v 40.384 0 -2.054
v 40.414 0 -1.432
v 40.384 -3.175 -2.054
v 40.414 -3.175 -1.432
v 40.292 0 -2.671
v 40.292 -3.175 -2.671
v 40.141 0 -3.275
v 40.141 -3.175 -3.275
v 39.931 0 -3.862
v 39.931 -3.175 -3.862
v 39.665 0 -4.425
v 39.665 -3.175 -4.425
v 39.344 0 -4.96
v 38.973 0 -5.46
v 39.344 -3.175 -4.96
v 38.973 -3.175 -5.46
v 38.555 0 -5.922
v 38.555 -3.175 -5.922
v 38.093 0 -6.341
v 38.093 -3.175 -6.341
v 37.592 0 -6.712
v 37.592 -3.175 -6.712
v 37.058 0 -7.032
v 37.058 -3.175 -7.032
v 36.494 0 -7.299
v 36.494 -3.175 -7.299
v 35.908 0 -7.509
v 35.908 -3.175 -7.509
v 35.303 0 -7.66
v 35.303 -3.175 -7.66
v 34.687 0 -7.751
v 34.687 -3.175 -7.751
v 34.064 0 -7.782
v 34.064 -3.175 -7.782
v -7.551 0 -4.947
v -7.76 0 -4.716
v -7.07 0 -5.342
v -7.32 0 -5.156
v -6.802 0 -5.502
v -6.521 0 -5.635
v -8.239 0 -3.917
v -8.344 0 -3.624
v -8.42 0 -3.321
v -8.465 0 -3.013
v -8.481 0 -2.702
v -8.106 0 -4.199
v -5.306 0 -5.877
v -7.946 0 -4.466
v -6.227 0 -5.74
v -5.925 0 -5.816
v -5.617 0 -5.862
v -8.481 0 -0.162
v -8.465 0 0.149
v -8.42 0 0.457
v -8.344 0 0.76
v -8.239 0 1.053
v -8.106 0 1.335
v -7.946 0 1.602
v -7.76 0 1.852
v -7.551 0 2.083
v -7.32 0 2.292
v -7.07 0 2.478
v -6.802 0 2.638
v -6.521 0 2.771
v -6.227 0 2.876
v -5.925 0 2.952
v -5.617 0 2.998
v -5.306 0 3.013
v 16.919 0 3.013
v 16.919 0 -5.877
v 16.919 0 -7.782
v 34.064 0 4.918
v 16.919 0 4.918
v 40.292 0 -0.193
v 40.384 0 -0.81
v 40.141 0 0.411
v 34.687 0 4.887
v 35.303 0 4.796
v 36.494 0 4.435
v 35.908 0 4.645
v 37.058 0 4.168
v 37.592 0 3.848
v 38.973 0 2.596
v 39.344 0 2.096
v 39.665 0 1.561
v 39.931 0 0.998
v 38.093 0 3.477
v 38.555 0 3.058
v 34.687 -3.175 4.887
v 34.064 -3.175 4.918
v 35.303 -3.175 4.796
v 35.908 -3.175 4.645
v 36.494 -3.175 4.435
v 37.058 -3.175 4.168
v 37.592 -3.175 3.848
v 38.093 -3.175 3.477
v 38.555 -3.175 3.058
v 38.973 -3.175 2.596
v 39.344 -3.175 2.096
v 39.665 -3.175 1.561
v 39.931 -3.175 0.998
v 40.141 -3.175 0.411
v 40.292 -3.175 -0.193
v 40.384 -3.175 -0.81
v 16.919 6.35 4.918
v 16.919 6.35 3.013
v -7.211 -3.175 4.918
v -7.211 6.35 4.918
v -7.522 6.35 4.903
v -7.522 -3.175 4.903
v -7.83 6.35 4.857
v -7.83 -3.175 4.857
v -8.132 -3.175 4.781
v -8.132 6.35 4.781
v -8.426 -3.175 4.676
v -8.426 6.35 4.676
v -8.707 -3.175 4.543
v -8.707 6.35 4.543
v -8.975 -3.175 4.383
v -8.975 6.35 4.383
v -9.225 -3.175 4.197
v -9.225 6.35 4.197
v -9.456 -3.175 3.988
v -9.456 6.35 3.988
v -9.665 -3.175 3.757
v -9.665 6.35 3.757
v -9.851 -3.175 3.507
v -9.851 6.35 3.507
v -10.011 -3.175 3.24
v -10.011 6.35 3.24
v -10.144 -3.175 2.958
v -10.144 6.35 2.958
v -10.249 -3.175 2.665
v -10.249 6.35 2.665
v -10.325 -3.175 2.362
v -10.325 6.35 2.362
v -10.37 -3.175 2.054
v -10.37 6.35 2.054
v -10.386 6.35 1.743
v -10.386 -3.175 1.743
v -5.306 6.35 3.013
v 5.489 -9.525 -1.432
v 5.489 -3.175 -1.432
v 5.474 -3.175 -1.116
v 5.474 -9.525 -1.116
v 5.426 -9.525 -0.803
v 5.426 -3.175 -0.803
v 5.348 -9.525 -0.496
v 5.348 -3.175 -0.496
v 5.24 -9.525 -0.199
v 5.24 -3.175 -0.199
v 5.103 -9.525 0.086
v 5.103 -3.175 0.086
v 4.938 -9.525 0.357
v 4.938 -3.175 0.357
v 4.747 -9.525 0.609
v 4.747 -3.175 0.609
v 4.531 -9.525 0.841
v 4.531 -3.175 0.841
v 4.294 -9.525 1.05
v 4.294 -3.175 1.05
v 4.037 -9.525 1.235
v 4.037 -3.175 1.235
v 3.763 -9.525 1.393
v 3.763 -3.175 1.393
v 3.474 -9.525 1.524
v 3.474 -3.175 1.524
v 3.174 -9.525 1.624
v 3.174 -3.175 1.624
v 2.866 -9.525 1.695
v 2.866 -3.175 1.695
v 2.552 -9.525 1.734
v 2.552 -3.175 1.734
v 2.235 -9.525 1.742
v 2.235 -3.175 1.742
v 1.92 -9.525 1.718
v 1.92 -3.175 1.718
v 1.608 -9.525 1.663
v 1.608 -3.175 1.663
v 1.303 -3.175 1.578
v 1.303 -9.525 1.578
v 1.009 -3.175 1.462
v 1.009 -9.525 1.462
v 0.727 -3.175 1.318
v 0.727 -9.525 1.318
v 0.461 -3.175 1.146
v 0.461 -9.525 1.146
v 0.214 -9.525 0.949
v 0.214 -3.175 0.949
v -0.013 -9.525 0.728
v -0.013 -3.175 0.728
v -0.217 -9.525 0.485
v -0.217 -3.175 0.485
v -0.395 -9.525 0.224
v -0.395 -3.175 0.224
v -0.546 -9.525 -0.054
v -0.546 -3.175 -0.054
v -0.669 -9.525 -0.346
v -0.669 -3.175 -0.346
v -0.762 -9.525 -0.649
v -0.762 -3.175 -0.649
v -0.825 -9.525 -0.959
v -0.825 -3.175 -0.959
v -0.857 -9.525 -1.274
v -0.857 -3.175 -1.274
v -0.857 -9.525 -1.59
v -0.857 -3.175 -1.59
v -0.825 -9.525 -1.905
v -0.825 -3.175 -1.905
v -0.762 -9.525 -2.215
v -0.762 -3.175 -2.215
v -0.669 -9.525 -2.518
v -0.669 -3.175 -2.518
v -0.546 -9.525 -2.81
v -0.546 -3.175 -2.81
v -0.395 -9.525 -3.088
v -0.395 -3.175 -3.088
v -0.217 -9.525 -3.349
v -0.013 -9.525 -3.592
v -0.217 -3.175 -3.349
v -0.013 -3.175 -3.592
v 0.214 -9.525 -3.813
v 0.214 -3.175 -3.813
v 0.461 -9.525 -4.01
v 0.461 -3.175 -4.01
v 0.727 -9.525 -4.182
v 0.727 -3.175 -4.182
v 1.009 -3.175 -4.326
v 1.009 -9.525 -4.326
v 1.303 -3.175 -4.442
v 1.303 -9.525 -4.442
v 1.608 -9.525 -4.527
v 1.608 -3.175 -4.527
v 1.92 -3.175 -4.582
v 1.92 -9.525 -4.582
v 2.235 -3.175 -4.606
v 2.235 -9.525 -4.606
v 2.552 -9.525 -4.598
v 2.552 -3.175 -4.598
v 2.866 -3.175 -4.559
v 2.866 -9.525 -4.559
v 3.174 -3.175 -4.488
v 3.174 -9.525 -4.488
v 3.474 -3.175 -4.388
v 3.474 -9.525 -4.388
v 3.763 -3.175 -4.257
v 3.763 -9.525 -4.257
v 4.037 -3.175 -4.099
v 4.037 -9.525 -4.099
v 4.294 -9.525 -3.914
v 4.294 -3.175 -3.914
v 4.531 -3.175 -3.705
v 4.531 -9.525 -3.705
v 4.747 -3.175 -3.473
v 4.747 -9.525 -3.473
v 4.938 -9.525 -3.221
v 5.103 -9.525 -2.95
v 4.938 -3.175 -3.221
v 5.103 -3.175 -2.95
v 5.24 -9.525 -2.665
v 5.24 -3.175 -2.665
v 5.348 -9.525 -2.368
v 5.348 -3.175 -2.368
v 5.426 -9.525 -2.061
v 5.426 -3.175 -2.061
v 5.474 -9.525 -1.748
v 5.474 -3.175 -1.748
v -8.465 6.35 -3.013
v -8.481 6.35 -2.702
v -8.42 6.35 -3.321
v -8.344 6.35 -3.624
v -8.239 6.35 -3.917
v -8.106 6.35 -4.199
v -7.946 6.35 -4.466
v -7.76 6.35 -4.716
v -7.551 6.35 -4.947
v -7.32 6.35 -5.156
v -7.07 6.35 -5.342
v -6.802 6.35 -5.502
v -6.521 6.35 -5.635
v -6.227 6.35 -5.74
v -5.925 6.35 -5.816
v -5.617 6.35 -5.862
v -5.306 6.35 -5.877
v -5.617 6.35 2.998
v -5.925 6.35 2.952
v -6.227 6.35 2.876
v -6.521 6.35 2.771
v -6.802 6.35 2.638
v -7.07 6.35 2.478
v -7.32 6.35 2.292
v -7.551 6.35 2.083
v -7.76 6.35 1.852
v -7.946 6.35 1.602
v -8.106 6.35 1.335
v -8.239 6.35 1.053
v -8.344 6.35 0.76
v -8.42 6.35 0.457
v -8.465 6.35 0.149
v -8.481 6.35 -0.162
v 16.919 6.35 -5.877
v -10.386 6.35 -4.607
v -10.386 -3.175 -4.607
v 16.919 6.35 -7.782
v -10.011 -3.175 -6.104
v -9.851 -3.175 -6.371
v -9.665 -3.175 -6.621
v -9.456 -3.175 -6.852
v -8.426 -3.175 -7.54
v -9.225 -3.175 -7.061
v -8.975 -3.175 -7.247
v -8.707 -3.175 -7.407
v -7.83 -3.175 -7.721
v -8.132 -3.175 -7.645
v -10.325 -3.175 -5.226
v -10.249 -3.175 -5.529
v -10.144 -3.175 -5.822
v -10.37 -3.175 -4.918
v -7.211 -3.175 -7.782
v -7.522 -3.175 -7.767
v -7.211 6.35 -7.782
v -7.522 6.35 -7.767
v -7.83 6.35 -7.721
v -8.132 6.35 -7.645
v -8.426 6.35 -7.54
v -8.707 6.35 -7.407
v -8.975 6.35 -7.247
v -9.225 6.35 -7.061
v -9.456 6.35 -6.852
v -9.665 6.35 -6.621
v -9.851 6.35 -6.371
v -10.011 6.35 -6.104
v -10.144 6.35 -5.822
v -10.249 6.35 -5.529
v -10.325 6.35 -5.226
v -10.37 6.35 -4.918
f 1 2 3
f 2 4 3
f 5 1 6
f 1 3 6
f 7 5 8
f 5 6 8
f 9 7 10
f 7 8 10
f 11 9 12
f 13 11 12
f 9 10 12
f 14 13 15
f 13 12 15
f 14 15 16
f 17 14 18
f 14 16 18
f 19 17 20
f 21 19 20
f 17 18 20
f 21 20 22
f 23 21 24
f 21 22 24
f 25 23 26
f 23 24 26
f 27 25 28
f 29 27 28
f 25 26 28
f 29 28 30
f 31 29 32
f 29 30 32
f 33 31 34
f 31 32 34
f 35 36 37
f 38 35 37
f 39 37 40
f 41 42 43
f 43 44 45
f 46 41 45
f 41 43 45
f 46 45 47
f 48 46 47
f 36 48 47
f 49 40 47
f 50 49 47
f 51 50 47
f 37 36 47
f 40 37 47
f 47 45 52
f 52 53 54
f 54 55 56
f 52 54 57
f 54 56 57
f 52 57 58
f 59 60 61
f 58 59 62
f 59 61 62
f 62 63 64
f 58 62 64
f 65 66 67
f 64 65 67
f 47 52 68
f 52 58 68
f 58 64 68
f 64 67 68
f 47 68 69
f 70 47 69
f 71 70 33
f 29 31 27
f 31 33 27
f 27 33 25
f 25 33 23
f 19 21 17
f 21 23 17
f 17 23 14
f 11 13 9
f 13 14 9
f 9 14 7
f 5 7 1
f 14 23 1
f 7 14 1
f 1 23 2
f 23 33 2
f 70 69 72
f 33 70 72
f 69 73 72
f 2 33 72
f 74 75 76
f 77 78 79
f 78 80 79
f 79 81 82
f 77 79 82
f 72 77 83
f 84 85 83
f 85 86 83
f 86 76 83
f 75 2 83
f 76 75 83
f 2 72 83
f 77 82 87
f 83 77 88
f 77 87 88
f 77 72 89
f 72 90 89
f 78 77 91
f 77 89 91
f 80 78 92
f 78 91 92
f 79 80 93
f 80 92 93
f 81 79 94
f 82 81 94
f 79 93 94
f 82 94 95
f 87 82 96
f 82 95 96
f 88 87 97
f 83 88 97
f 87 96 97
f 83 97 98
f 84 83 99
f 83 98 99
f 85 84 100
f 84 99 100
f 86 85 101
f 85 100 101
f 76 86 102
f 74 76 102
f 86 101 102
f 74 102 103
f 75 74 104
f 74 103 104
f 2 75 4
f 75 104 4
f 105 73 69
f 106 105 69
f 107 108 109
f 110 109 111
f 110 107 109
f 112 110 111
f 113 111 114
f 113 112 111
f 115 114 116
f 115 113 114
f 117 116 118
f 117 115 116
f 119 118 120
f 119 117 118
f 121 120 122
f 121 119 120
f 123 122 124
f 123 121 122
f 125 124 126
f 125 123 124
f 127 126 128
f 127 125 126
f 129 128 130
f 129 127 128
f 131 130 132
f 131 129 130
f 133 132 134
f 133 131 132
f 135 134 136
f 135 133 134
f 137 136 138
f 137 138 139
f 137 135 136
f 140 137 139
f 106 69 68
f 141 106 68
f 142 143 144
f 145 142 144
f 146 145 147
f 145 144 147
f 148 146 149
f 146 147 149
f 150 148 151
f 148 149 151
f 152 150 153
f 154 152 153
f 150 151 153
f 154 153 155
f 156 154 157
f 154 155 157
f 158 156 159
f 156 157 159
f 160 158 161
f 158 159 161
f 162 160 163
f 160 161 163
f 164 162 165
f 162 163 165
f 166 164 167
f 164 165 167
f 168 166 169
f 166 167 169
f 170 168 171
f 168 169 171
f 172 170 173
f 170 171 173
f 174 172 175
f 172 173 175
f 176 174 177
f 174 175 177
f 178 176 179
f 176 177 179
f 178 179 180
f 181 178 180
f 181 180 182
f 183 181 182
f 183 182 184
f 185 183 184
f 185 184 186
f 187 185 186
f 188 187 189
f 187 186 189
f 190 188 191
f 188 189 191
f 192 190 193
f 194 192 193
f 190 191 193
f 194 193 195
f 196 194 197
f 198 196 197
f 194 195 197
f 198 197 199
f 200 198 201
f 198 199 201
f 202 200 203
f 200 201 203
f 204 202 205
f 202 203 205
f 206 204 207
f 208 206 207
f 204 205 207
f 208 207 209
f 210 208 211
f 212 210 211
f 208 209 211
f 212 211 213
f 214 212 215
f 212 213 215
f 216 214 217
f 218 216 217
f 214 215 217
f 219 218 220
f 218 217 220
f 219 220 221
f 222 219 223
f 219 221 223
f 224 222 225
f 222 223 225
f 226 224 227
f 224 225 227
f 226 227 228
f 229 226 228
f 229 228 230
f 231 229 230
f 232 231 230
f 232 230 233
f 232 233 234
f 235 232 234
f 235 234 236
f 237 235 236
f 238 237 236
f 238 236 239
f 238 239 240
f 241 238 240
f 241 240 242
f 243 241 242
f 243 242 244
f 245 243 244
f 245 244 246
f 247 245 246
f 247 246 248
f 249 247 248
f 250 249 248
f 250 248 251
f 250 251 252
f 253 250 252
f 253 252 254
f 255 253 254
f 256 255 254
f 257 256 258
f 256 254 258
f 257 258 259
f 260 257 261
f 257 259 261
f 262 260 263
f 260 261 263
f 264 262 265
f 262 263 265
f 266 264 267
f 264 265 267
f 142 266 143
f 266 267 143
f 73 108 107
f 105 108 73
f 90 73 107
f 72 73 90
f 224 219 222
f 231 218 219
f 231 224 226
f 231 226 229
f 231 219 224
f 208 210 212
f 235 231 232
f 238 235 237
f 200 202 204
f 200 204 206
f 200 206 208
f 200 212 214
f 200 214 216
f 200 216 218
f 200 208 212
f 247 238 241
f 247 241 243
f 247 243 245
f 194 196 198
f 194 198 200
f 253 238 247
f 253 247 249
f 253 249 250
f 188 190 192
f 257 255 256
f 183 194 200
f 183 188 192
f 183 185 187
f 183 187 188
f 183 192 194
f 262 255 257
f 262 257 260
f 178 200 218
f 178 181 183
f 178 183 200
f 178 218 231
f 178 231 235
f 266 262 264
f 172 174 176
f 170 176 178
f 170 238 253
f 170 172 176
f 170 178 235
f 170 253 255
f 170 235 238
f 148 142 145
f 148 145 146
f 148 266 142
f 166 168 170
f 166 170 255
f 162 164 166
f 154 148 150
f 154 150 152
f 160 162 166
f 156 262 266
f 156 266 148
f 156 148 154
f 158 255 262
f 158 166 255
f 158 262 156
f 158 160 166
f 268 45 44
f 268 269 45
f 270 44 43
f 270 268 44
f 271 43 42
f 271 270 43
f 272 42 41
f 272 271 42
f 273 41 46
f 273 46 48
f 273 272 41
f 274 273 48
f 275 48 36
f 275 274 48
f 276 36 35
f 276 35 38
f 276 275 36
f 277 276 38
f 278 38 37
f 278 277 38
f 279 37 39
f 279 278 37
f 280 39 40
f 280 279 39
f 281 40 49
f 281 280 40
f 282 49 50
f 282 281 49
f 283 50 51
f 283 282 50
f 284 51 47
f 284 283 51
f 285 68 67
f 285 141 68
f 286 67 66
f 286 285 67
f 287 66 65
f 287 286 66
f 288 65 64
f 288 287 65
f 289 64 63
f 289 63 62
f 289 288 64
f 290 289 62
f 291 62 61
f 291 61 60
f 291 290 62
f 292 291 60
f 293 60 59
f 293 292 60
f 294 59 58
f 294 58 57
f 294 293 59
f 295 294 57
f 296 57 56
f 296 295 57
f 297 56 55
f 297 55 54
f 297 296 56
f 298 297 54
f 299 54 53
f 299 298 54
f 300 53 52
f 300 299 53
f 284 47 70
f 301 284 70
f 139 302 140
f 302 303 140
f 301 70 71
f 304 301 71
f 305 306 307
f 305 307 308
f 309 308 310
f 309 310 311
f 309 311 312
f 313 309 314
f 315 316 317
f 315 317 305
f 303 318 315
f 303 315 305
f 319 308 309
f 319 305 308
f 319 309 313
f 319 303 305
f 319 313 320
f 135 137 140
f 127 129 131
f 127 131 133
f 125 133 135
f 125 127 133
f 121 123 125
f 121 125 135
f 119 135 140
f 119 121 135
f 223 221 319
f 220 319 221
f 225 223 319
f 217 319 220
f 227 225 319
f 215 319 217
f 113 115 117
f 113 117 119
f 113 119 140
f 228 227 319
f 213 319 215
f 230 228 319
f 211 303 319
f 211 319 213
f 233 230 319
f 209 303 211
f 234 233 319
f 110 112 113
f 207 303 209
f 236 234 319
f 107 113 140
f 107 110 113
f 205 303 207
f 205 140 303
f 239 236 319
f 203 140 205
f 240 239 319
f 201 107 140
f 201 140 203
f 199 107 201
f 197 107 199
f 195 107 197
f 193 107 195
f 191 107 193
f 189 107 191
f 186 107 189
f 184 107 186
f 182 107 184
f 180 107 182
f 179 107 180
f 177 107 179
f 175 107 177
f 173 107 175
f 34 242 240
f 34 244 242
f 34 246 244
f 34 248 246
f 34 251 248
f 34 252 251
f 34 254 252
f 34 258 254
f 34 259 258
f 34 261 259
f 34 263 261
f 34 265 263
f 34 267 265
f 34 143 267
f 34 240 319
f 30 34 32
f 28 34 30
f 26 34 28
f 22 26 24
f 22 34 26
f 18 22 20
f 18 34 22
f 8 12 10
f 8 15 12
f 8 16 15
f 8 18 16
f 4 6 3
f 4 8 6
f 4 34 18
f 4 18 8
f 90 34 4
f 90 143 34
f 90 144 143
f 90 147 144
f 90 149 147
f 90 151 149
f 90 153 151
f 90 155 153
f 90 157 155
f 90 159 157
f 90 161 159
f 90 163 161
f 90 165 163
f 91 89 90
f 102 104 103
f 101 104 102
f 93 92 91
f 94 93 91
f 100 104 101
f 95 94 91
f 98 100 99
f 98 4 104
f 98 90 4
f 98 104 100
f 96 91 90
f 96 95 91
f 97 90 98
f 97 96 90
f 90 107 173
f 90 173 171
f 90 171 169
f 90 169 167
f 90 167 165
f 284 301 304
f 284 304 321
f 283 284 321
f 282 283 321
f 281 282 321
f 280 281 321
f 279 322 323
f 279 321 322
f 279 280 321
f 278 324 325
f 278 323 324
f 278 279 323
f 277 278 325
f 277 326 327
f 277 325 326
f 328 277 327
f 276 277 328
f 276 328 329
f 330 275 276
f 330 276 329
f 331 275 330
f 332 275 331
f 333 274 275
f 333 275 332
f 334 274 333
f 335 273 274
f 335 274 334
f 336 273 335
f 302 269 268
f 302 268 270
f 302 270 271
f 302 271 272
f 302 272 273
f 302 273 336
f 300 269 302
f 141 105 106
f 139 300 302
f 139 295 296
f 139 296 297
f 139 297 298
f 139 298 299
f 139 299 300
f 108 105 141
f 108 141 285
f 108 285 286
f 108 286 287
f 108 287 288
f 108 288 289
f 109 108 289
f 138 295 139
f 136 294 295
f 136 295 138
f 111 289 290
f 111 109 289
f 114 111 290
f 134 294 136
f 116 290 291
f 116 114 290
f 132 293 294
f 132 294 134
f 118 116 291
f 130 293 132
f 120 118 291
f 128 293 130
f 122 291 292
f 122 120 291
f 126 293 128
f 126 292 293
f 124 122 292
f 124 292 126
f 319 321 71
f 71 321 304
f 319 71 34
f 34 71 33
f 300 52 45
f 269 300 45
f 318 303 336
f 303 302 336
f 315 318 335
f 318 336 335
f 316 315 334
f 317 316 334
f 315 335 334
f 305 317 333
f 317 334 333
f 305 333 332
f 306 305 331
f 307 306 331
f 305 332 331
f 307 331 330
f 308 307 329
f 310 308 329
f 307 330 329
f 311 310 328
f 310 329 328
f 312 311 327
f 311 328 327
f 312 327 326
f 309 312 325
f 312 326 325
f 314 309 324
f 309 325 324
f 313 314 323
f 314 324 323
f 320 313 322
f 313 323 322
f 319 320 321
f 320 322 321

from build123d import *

# Parameters (mm, degrees)
F0_W     = 50.8
F0_H     = 12.7
F1_DEPTH = 3.175
F2_R     = 3.175
F3_DEPTH = 6.35
F5_DEPTH = 6.35
F6_R     = 6.34999
F7_R     = 3.175


# Not quite as in the source:
# - a fillet or chamfer is up to 0.001 mm smaller than in the source, because OpenCascade refuses the exact size


with BuildPart() as f1:
    # F0 (on Front) → F1 (new body)
    with BuildSketch(Plane.XZ):
        with Locations((15.0143924374, -1.4320164919)):
            Rectangle(F0_W, F0_H)
    extrude(amount=F1_DEPTH)

    # F2 (on face) → F3 (join)
    with BuildSketch(Plane.XZ.offset(3.175)):
        with Locations((2.3143924374, -1.4320164919)):
            Circle(F2_R)
    extrude(amount=F3_DEPTH)

    # F4 (on face) → F5 (join)
    with BuildSketch(Plane(origin=(0, 0, 0), x_dir=(-1, 0, 0), z_dir=(0, 1, 0))):
        Polygon((8.4806075626, 3.0129835081), (8.4806075626, -5.8770164919), (-16.9193924374, -5.8770164919), (-16.9193924374, -7.7820164919), (10.3856075626, -7.7820164919), (10.3856075626, 4.9179835081), (-16.9193924374, 4.9179835081), (-16.9193924374, 3.0129835081), align=None)
    extrude(amount=F5_DEPTH)

    # F6 (radius 6.35 in the source; OpenCascade refuses exactly that, so slightly less here)
    f6_edges = [f1.edges().sort_by_distance(p)[0] for p in [
        (40.414392, -1.5875, 4.917984),
        (40.414392, -1.5875, -7.782016),
    ]]
    fillet(f6_edges, radius=F6_R)

    # F7
    f7_edges = [f1.edges().sort_by_distance(p)[0] for p in [
        (-8.480608, 3.175, 3.012984),
        (-8.480608, 3.175, -5.877016),
        (-10.385608, 1.5875, 4.917984),
        (-10.385608, 1.5875, -7.782016),
    ]]
    fillet(f7_edges, radius=F7_R)


solid = f1.part
